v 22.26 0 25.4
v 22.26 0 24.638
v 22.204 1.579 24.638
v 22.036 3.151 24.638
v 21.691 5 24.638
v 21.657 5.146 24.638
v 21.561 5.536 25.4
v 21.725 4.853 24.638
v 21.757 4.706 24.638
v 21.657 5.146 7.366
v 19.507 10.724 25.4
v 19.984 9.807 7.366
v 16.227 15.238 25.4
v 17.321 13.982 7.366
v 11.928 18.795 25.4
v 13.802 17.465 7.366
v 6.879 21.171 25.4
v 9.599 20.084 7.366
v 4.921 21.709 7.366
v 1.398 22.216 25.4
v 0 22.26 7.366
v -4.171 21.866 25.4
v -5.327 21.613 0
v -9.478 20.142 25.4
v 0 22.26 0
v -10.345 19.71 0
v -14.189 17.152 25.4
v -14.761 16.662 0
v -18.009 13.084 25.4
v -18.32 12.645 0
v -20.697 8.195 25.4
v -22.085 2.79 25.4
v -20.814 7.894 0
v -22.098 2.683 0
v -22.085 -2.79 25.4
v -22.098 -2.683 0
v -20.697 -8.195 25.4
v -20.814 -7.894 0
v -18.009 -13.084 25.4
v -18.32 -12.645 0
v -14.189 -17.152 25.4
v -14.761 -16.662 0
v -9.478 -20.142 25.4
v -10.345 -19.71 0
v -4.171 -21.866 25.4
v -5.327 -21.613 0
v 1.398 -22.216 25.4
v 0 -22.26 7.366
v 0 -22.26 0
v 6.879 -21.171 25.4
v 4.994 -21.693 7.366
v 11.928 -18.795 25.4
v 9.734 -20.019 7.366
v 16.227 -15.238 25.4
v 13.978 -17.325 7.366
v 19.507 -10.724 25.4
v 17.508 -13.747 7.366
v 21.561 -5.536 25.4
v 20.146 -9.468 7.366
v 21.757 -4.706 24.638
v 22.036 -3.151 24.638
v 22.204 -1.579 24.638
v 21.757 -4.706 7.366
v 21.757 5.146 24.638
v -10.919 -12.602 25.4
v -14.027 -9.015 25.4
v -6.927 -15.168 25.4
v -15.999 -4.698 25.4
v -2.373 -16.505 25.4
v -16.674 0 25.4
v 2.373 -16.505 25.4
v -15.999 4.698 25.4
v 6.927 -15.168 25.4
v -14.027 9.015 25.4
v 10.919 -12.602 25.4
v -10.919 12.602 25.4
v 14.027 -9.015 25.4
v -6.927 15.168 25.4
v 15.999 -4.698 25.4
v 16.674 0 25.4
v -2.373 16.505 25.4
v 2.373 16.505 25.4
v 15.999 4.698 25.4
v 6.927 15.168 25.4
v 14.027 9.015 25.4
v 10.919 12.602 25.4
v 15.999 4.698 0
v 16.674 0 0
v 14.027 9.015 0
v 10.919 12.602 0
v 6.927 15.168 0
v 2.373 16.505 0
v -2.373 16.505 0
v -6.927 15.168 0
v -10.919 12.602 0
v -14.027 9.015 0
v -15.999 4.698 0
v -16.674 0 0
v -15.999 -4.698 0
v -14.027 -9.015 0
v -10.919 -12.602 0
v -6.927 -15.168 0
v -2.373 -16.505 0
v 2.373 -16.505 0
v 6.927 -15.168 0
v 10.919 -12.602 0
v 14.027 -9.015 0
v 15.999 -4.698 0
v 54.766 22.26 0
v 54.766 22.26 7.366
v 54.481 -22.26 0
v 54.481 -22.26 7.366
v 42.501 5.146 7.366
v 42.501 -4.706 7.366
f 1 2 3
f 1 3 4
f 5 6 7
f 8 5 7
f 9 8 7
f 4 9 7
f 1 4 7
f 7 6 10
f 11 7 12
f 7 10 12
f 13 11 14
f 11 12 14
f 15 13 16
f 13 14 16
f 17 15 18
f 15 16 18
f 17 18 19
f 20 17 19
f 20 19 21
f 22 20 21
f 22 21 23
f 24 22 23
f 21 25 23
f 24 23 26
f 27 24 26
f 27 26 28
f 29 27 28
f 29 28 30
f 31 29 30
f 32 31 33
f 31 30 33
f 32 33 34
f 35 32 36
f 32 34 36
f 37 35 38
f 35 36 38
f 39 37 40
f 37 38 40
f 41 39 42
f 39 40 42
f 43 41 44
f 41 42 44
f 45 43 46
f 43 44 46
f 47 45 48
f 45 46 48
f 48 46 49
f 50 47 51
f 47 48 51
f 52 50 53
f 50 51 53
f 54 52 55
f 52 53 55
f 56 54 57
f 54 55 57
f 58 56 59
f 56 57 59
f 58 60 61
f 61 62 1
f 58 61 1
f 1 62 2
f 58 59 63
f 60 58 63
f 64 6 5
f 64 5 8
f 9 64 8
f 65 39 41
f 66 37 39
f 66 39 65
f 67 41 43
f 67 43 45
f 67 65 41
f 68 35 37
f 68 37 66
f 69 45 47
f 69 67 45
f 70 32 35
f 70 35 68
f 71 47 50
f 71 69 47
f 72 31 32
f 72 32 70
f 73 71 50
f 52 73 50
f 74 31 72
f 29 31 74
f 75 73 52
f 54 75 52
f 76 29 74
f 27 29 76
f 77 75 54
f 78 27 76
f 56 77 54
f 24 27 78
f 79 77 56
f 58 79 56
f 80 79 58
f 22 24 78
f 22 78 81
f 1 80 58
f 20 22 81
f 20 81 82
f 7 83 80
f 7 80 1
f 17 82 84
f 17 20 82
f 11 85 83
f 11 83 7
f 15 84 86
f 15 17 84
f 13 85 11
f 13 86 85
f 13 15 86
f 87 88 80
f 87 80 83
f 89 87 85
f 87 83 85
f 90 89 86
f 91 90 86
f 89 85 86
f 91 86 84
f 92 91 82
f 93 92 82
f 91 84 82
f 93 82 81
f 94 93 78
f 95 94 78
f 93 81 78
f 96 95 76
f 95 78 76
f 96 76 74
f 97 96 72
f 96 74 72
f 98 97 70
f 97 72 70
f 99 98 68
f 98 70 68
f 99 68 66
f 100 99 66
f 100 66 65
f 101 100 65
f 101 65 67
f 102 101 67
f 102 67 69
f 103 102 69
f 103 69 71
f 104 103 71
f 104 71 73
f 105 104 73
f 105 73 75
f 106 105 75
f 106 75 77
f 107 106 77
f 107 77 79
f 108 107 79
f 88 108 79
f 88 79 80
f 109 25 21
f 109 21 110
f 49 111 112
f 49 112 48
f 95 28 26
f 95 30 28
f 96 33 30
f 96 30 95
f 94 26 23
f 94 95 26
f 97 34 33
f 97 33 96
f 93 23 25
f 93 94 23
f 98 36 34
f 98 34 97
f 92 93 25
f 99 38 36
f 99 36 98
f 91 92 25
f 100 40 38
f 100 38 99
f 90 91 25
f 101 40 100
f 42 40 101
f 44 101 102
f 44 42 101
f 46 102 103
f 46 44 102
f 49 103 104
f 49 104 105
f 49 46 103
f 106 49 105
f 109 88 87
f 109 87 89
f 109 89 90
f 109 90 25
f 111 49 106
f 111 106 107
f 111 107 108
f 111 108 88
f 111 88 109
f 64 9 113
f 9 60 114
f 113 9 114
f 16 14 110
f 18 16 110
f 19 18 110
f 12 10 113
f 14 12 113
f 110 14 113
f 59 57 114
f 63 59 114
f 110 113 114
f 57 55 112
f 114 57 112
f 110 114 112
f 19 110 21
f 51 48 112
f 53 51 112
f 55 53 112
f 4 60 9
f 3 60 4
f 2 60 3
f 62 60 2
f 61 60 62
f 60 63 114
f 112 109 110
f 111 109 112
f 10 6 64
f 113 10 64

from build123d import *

# Parameters (mm, degrees)
F0_R     = 22.260195
F1_DEPTH = 25.4
F3_DEPTH = 7.366
F4_R     = 16.674385
F5_DEPTH = 25.401
F6_W     = 20.843665
F6_H     = 9.852567
F7_DEPTH = 17.272
F9_DEPTH = 26.967665


with BuildPart() as f1:
    # F0 (on Top) → F1 (new body)
    with BuildSketch(Plane.XY):
        Circle(F0_R)
    extrude(amount=F1_DEPTH)

    # F2 (on face) → F3 (join)
    with BuildSketch(Plane(origin=(0, 0, 0), x_dir=(1, 0, 0), z_dir=(0, 0, -1))):
        with BuildLine():
            ThreePointArc((22.260195, 0), (15.740335, -15.740335), (0, -22.260195))
            Line((0, -22.260195), (54.766204, -22.260195))
            Line((54.766204, -22.260195), (54.480962, 22.260195))
            Line((54.480962, 22.260195), (0, 22.260195))
            ThreePointArc((0, 22.260195), (15.740335, 15.740335), (22.260195, 0))
        make_face()
    extrude(amount=-F3_DEPTH)

    # F4 (on face) → F5 (cut, through all)
    with BuildSketch(Plane.XY.offset(25.4)):
        Circle(F4_R)
    extrude(amount=-F5_DEPTH, mode=Mode.SUBTRACT)

    # F6 (on face) → F7 (join)
    with BuildSketch(Plane.XY.offset(7.366)):
        with Locations((32.079024, 0.219813)):
            Rectangle(F6_W, F6_H)
    extrude(amount=F7_DEPTH)

    # F8 (on face) → F9 (cut, through all)
    with BuildSketch(Plane.XZ.offset(4.706471)):
        Polygon((42.500857, 24.638), (21.756962, 24.638), (42.500857, 7.366), align=None)
    extrude(amount=-F9_DEPTH, mode=Mode.SUBTRACT)


solid = f1.part
